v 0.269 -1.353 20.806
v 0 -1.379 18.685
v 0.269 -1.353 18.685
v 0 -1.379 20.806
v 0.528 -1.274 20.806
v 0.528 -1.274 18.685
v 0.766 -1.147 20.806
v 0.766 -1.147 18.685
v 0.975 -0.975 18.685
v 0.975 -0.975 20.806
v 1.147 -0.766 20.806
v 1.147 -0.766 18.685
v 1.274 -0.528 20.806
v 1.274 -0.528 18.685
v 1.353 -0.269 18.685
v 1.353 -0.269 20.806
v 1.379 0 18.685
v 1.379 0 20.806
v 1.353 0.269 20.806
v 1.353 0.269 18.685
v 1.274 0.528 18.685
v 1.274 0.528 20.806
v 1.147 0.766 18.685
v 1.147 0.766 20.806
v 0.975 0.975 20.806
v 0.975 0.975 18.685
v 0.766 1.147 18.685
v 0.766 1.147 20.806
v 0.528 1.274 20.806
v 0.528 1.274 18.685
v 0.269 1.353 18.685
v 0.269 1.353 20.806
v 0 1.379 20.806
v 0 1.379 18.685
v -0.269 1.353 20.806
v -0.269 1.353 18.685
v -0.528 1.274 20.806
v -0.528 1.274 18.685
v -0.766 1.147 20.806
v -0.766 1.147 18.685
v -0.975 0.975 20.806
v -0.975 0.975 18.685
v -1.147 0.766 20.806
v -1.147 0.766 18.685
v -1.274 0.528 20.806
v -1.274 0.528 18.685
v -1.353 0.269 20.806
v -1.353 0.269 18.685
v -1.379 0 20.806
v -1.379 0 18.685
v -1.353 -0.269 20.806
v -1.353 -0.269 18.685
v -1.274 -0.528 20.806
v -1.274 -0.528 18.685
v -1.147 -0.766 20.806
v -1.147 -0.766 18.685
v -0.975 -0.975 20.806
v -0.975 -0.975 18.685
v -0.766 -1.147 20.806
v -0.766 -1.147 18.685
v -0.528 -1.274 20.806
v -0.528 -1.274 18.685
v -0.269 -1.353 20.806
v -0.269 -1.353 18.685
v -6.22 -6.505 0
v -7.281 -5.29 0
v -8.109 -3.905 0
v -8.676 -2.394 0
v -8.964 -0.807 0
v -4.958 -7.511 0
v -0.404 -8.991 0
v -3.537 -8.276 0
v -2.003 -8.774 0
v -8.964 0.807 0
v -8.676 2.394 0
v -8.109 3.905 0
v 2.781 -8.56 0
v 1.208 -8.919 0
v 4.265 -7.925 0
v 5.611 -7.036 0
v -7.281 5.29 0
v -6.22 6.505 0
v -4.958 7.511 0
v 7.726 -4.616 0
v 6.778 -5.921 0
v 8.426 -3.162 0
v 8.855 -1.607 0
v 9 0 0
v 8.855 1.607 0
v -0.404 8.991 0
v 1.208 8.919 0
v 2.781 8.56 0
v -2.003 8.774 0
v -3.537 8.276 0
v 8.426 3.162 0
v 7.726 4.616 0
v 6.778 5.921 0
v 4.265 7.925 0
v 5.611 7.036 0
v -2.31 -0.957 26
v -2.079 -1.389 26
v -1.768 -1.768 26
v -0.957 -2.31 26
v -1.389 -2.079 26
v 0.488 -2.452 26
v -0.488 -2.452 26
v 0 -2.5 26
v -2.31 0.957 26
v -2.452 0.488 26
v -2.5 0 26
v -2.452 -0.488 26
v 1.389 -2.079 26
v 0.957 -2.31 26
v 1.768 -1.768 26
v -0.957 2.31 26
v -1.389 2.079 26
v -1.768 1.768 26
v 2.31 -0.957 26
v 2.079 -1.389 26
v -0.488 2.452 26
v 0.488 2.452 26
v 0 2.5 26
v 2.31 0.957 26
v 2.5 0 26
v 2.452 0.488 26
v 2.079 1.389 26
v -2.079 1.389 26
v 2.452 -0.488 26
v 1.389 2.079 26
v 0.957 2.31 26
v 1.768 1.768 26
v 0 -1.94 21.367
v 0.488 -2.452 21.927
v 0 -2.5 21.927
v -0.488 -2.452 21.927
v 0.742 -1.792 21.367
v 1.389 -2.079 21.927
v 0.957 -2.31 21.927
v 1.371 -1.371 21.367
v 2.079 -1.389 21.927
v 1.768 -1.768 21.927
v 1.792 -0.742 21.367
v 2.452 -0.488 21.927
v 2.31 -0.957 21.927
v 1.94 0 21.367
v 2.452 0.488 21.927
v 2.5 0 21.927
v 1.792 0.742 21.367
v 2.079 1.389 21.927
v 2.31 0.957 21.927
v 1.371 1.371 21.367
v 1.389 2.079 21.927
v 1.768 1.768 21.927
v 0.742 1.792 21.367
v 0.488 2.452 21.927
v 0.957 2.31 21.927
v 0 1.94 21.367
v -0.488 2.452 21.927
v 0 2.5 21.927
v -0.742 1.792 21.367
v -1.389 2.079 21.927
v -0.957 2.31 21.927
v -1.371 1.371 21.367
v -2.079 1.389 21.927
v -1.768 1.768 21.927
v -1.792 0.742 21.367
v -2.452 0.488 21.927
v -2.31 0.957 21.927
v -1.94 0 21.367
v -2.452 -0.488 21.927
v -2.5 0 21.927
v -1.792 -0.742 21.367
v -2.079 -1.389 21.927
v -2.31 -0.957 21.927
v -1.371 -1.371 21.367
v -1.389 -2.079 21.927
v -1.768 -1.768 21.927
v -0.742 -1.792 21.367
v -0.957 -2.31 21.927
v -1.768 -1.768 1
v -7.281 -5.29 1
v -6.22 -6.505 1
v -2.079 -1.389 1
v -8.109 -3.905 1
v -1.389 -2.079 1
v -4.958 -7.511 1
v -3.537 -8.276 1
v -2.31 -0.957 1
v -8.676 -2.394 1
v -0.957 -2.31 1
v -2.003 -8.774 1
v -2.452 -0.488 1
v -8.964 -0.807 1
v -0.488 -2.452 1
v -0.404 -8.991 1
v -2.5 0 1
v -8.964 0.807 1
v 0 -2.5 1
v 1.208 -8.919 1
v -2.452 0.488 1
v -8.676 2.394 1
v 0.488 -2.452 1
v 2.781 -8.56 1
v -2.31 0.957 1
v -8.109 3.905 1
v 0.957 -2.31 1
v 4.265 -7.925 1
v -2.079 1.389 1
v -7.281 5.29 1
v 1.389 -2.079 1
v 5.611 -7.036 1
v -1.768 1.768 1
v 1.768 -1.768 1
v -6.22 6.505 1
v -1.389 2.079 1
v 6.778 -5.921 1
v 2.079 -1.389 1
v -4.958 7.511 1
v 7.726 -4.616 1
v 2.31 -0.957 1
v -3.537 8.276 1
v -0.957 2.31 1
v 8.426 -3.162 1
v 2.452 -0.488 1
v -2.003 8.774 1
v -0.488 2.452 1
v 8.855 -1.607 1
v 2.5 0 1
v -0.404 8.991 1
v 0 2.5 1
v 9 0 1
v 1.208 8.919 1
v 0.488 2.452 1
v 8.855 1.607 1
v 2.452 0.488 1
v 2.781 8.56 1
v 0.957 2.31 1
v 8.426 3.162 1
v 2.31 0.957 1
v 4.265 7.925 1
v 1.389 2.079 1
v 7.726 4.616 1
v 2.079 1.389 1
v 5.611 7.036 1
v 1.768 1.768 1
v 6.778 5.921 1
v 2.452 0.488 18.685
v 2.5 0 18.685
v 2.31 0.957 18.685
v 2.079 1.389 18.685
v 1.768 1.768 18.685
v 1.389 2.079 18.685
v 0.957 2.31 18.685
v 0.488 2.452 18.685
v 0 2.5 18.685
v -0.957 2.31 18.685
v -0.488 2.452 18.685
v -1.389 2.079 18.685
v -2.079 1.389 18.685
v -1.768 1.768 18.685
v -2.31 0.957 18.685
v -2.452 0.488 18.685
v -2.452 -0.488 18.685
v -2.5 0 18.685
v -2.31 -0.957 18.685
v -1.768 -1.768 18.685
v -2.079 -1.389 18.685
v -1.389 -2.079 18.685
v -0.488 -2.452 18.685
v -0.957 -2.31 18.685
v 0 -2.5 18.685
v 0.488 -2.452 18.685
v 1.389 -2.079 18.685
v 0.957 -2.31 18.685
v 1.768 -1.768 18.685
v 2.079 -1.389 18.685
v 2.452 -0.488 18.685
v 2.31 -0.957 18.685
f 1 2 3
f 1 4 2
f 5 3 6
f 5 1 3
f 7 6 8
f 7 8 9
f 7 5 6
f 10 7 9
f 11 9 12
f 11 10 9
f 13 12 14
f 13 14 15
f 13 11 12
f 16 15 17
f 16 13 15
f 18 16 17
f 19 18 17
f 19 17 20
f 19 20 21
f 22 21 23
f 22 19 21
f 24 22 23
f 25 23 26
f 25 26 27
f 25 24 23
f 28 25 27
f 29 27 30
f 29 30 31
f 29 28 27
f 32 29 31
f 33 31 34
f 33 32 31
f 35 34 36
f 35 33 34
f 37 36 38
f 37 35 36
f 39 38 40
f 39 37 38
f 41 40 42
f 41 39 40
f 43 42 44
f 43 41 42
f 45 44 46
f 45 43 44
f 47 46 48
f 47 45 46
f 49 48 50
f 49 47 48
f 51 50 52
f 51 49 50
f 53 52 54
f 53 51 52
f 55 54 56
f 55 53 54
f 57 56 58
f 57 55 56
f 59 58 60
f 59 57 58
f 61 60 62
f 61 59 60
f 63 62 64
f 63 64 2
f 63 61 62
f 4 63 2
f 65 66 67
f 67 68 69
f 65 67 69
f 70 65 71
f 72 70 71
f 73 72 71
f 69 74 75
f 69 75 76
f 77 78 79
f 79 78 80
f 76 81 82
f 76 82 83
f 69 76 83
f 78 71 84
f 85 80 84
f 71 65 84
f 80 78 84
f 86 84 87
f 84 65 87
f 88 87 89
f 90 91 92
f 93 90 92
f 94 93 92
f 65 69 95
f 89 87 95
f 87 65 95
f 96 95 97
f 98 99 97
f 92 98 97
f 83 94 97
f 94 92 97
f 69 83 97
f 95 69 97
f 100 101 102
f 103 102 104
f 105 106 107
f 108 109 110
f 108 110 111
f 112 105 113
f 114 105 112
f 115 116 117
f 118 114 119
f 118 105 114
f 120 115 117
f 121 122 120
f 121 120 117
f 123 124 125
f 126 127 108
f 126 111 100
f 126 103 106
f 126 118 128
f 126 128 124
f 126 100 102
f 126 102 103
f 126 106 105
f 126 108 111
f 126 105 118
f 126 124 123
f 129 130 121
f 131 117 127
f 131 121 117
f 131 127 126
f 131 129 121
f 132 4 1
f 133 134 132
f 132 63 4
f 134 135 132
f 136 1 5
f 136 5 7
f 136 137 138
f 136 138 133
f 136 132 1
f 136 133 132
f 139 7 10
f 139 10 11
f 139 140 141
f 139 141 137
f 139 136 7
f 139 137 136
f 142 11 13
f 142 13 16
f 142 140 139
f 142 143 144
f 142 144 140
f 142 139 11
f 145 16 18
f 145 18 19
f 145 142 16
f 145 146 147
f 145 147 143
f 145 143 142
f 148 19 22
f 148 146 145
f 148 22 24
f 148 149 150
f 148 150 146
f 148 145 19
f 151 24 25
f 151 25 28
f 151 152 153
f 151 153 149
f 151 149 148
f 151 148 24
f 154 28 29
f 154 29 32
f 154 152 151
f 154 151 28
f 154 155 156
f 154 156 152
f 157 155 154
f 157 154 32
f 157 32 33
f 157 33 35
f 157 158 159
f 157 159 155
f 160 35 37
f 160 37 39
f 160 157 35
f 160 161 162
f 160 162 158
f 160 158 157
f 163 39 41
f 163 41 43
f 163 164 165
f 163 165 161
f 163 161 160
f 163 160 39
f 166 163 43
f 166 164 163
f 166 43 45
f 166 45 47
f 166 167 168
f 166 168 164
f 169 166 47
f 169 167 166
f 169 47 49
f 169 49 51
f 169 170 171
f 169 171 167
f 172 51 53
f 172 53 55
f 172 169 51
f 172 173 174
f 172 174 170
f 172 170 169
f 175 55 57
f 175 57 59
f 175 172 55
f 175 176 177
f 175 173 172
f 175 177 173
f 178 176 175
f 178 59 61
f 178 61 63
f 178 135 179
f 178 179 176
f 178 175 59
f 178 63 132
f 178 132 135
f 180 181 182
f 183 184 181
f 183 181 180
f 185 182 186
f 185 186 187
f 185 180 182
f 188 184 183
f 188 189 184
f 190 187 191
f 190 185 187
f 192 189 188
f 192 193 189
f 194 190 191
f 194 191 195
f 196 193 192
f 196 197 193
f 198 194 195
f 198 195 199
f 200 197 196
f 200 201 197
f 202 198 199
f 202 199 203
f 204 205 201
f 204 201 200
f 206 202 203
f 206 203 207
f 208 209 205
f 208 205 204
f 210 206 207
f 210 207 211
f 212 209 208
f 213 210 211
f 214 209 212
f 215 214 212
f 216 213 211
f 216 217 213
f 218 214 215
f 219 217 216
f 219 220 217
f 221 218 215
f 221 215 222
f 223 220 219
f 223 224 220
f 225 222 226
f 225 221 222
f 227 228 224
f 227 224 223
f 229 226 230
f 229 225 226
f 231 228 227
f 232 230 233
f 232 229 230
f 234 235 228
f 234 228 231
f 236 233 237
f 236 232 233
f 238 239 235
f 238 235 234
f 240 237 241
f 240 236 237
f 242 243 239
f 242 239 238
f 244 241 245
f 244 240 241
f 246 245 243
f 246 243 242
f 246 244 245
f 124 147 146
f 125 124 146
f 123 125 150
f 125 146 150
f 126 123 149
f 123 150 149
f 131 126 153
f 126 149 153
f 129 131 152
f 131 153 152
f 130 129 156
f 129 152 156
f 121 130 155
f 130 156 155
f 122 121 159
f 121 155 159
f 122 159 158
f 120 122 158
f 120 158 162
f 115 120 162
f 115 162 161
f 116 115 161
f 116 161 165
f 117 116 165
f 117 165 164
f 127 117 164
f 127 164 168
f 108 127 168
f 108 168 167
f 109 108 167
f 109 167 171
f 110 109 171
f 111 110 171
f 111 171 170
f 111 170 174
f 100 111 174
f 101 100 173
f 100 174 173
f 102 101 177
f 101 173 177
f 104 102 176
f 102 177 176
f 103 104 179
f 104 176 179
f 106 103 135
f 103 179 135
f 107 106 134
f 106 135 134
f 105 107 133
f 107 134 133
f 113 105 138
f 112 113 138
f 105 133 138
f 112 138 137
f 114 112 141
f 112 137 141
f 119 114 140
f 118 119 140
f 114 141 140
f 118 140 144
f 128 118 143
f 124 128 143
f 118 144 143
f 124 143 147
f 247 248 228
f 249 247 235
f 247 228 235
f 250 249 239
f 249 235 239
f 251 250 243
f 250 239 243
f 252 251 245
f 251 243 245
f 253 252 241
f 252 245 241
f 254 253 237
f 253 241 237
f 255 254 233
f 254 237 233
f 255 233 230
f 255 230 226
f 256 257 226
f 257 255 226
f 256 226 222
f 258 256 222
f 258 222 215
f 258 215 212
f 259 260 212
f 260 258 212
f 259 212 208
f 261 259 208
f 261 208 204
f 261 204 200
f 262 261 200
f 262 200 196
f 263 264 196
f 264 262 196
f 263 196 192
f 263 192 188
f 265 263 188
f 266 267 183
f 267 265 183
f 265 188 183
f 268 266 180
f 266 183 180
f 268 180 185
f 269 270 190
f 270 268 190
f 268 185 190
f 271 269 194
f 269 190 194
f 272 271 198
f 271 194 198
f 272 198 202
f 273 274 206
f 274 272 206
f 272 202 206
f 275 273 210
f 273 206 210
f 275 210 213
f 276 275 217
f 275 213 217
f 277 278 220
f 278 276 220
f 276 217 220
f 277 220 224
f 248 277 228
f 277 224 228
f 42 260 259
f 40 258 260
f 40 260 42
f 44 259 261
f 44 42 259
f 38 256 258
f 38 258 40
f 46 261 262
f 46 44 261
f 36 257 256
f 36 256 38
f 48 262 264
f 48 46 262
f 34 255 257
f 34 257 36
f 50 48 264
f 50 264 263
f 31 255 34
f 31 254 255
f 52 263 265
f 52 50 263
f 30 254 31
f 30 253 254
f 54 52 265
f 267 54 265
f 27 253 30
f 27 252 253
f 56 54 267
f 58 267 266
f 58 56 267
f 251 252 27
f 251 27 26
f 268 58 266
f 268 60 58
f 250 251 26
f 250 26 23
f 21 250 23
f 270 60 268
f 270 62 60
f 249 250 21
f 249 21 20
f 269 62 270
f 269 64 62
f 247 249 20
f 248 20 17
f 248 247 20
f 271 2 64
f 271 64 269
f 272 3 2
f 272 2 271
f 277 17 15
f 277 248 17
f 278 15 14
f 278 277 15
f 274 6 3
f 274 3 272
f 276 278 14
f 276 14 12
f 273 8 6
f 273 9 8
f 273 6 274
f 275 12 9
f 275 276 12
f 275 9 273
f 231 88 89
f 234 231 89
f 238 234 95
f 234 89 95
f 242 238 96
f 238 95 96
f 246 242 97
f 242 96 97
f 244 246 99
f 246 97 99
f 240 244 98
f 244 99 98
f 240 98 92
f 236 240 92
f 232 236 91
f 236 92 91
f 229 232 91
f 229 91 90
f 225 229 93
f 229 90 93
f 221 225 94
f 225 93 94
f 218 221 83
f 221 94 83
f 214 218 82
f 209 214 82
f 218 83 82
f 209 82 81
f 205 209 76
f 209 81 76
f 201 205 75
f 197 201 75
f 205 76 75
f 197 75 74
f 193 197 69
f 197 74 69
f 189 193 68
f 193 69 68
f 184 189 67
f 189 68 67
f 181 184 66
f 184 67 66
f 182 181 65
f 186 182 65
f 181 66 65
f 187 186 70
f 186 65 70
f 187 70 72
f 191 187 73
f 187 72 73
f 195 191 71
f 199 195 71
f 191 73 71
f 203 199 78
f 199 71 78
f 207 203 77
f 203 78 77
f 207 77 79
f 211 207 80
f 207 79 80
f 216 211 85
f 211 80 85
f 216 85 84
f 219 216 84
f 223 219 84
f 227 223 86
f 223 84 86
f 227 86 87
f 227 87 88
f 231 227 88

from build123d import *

# Parameters (mm, degrees)
F0_R     = 9
F1_DEPTH = 1
F2_R     = 2.5
F3_DEPTH = 25


with BuildPart() as f1:
    # F0 (on Top) → F1 (new body)
    with BuildSketch(Plane.XY):
        Circle(F0_R)
    extrude(amount=F1_DEPTH)

    # F2 (on face) → F3 (join)
    with BuildSketch(Plane.XY.offset(1)):
        Circle(F2_R)
    extrude(amount=F3_DEPTH)

    # F5 (on Right) → F6 (revolve, cut)
    with BuildSketch(Plane.YZ):
        Polygon((-2.54262, 21.969934), (-2.54262, 18.685159), (-1.379166, 18.685159), (-1.379166, 20.806479), align=None)
    revolve(axis=Axis((0, 0, 9.517463), (0, 0, 1)), mode=Mode.SUBTRACT)


solid = f1.part
